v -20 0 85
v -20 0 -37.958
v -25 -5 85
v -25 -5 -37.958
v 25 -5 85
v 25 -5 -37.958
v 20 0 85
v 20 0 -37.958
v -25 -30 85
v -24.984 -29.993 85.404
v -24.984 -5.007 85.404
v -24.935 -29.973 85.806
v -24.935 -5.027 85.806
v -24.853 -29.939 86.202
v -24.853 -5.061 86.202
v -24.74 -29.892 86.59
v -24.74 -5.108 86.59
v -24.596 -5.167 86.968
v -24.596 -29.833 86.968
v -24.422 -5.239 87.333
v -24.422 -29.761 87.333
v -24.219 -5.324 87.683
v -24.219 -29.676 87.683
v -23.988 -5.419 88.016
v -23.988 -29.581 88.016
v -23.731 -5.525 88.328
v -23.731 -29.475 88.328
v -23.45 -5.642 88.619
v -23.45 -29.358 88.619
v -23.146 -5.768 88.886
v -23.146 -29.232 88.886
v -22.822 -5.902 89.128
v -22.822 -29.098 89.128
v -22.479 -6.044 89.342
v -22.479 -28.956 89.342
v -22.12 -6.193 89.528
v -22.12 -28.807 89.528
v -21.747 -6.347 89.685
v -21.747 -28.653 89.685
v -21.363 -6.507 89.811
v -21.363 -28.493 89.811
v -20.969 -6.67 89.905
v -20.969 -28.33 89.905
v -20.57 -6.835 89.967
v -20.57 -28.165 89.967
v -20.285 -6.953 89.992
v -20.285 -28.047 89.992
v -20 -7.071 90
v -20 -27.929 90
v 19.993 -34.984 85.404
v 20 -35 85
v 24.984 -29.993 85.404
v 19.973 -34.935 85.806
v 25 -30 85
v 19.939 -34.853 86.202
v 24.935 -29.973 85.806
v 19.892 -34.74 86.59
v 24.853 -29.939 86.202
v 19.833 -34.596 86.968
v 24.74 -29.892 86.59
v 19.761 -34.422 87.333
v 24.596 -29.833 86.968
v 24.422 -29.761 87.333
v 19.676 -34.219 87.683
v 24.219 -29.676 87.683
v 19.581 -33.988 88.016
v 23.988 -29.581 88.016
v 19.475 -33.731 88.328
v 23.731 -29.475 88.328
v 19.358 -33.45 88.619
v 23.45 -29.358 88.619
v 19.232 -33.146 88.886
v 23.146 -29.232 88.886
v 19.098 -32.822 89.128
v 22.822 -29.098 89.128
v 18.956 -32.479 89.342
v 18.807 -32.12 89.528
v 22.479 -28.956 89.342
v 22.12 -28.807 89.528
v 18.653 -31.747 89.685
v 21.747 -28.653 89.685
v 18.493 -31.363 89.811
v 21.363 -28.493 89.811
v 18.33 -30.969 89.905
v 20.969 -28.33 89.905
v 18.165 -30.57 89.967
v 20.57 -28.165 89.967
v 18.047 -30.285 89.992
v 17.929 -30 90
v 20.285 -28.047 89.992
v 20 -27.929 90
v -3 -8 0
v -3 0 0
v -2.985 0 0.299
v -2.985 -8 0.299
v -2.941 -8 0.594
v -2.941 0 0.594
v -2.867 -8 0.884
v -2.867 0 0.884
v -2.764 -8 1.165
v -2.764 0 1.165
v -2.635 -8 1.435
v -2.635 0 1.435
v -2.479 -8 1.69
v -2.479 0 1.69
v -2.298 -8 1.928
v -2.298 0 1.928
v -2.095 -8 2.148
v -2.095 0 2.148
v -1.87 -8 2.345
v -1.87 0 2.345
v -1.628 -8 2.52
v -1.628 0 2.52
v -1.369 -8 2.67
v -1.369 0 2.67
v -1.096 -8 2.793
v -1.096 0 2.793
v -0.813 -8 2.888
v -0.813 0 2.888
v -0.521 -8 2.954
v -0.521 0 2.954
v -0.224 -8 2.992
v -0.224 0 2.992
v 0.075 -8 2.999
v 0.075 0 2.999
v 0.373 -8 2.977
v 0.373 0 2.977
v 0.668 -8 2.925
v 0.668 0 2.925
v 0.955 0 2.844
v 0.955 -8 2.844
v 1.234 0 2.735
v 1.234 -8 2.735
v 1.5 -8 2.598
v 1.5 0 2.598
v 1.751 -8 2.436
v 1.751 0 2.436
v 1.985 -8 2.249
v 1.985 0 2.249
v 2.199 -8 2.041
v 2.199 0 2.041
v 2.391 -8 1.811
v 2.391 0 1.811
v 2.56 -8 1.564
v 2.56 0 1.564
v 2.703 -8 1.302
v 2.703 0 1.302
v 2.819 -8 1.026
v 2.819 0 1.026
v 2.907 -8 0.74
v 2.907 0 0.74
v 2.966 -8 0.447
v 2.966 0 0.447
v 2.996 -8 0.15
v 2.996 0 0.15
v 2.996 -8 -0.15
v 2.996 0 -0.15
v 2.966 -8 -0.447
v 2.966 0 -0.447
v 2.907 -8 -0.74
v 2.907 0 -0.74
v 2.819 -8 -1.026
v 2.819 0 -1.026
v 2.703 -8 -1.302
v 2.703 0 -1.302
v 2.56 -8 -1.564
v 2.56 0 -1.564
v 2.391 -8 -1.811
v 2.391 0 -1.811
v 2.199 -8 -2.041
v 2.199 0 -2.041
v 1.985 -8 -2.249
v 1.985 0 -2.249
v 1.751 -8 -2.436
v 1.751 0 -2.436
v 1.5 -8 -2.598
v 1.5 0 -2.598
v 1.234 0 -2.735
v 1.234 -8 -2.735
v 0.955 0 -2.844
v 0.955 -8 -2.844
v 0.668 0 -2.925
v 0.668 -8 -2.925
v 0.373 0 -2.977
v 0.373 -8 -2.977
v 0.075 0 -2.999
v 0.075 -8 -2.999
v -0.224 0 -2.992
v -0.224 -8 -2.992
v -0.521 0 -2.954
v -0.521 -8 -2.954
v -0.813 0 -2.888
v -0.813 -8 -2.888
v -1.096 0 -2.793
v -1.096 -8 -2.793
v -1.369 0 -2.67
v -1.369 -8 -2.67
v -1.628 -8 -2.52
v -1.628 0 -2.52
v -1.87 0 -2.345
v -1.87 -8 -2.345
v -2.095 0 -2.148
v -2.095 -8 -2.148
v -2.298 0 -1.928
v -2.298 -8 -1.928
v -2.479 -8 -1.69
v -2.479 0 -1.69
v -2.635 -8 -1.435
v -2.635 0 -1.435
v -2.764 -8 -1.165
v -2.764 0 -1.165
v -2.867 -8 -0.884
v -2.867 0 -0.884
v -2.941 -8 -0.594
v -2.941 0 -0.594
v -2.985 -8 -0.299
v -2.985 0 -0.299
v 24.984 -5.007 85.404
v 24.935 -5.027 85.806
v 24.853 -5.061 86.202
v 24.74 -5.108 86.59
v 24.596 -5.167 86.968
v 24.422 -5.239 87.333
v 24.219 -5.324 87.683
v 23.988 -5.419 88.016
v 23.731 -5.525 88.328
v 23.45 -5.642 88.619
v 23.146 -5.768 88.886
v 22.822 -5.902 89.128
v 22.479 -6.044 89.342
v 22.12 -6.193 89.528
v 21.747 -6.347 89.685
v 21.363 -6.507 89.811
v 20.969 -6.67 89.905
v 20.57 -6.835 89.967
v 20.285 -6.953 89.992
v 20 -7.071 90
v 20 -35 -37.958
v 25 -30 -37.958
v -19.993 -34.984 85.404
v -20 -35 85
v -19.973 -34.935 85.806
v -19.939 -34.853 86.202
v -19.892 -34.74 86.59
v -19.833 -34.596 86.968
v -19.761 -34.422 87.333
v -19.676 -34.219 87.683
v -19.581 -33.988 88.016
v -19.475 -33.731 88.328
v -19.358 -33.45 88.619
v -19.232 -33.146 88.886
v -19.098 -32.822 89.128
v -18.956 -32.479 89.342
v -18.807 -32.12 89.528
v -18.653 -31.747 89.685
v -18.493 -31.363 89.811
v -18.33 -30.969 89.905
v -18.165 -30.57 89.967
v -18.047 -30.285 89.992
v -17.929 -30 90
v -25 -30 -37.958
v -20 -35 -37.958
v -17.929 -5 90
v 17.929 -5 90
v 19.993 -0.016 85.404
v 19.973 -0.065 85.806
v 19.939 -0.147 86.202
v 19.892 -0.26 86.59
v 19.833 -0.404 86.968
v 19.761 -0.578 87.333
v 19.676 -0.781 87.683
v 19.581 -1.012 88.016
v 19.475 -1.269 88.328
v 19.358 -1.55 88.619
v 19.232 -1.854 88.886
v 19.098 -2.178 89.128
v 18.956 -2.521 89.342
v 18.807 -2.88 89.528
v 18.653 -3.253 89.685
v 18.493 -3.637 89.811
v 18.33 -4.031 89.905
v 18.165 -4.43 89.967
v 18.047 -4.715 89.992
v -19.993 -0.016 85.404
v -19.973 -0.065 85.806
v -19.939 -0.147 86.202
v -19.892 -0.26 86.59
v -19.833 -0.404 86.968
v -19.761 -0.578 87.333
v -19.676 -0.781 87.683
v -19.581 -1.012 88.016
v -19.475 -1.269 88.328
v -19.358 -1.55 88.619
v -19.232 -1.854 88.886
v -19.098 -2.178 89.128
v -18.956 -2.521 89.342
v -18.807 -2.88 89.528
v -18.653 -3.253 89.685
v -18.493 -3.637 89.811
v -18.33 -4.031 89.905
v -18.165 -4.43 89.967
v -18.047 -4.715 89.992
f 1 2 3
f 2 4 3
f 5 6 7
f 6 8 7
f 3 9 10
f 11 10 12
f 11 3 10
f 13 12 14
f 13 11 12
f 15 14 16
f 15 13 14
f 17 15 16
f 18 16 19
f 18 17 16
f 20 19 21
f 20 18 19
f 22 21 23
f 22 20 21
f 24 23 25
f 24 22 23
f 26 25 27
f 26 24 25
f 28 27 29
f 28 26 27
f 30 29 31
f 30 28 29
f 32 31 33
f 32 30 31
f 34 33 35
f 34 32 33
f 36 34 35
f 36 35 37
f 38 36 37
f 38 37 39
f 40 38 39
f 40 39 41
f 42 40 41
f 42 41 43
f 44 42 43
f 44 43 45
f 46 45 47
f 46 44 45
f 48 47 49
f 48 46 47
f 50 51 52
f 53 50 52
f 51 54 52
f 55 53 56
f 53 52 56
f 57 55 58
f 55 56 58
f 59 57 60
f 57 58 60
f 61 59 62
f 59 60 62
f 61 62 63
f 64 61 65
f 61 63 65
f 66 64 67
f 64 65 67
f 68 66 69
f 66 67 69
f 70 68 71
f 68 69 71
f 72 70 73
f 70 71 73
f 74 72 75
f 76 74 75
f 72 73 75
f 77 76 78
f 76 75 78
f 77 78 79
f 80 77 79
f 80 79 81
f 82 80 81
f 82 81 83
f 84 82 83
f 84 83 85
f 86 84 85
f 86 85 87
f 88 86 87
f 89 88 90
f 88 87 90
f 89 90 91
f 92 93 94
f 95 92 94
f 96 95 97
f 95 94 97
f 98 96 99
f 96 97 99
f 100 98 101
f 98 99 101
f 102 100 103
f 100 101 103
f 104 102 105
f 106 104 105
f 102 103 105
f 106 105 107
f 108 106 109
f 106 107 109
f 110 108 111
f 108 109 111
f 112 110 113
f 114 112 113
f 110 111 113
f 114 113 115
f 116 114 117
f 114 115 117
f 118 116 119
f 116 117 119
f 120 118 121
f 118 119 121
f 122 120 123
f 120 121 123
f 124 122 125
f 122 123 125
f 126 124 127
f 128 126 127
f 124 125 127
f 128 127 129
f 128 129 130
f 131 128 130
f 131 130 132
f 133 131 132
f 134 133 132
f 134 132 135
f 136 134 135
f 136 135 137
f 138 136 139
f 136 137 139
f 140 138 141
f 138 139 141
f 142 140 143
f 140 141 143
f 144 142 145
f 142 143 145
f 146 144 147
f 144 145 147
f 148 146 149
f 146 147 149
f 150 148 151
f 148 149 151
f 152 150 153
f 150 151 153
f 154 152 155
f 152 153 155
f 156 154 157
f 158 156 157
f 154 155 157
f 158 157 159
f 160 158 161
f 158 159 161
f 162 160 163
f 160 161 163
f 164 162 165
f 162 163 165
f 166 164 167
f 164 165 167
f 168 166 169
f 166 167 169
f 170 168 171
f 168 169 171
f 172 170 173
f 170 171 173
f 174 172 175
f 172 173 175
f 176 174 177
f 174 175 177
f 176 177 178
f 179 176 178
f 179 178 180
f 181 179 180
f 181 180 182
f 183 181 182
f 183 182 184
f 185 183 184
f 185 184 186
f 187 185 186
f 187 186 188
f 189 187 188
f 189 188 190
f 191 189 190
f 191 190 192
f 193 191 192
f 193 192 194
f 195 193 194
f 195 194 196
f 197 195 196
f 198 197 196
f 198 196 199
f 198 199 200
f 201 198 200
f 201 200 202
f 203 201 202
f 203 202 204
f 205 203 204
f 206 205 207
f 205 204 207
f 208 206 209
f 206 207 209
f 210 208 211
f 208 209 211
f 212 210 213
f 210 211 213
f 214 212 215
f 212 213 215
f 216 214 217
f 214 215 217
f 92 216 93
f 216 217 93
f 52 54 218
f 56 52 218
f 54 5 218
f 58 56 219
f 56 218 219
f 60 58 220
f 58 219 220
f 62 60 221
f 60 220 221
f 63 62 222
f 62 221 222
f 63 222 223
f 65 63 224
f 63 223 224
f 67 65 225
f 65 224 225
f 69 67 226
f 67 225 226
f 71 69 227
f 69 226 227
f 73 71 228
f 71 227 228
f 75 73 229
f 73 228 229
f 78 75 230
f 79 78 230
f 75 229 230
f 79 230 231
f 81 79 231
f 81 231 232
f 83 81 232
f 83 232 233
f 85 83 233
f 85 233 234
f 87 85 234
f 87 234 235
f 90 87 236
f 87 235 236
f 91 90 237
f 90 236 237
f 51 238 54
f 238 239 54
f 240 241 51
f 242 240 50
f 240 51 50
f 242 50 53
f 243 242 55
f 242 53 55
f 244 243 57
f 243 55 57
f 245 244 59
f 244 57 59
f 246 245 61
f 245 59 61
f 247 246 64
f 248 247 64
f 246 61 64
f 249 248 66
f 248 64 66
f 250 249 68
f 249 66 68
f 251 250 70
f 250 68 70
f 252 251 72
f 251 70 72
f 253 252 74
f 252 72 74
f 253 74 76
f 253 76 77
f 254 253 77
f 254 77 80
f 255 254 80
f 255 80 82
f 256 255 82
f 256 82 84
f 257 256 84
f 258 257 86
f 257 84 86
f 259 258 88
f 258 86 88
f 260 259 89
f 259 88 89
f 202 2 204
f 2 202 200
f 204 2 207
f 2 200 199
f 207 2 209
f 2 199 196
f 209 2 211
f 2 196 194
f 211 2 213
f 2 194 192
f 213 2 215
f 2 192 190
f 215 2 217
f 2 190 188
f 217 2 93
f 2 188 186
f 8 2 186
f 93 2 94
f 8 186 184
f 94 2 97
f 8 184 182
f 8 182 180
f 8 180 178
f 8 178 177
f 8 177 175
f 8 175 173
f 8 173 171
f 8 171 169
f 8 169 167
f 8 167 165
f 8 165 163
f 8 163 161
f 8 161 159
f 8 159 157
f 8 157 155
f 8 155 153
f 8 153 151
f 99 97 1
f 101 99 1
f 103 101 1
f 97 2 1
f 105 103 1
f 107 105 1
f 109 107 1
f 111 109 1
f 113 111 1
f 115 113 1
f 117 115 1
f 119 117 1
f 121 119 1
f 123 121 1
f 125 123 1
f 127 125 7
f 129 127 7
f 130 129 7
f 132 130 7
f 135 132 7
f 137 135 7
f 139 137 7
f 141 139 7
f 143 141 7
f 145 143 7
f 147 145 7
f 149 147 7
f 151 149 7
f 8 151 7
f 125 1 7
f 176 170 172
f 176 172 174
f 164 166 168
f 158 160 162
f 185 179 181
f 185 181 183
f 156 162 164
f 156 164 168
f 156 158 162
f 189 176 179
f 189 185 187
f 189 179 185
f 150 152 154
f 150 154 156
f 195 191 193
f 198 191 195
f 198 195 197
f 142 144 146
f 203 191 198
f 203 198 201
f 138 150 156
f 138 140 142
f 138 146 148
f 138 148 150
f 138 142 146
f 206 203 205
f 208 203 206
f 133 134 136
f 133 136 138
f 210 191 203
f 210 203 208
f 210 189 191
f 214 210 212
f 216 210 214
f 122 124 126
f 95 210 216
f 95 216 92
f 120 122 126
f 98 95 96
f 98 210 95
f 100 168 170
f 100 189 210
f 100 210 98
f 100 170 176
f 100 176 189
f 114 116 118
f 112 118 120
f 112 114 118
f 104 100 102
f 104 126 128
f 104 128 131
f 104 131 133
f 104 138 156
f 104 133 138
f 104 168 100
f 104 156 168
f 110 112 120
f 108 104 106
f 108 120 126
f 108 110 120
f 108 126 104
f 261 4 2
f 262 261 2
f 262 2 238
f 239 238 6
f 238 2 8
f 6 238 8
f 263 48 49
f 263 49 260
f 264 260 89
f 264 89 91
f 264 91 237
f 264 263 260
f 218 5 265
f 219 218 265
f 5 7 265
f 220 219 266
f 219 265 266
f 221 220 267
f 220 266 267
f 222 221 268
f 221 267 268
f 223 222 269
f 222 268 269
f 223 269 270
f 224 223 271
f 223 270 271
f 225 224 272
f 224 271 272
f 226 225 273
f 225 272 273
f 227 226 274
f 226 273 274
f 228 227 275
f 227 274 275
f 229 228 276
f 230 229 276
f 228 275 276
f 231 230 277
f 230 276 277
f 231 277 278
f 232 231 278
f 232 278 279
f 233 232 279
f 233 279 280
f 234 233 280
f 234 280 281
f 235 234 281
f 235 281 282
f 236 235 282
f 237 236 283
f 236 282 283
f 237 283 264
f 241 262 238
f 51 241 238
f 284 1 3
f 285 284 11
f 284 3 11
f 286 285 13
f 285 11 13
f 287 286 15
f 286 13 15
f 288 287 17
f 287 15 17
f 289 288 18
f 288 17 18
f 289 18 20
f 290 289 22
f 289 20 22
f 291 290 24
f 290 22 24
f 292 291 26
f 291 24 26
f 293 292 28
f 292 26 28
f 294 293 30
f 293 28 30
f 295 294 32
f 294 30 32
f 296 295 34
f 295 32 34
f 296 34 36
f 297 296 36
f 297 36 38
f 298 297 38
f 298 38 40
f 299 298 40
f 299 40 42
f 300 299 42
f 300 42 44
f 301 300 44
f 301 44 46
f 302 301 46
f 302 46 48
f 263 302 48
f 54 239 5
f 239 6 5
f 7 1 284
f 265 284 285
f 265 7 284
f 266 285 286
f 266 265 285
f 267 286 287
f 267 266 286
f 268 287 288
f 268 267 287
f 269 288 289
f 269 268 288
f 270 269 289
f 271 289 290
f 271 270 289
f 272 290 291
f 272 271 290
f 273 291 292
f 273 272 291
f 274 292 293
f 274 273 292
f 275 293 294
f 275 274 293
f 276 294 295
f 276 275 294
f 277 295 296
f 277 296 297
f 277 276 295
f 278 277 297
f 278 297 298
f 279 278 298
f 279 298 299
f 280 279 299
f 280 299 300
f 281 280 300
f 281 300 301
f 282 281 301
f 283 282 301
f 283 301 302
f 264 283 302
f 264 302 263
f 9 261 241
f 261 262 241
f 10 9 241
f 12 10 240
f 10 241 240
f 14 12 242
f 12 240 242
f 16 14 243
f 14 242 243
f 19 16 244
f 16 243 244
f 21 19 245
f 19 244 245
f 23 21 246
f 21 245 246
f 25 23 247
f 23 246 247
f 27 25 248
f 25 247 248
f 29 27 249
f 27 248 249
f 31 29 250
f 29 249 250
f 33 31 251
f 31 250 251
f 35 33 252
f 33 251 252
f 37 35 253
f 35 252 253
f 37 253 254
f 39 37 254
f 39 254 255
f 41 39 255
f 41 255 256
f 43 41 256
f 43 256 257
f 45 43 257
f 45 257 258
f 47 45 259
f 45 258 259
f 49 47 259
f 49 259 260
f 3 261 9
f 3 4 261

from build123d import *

# Parameters (mm, degrees)
F0_W     = 50
F0_H     = 127.9575609275
F1_DEPTH = 10
F2_R     = 3
F3_DEPTH = 8
F4_DEPTH = 25
F5_SIZE  = 5
F6_SIZE  = 5
F7_SIZE  = 5
F8_SIZE  = 5
F9_R     = 5


with BuildPart() as f1:
    # F0 (on Front) → F1 (new body)
    with BuildSketch(Plane.XZ):
        with Locations((0, 26.0212195362)):
            Rectangle(F0_W, F0_H)
    extrude(amount=F1_DEPTH)

    # F2 (on face) → F3 (cut)
    with BuildSketch(Plane(origin=(0, 0, 0), x_dir=(-1, 0, 0), z_dir=(0, 1, 0))):
        Circle(F2_R)
    extrude(amount=-F3_DEPTH, mode=Mode.SUBTRACT)

    # F4 (add): a face of the model
    f4_faces = [f1.faces().sort_by_distance(p)[0] for p in [
        (0, -10, 26.0212195362),
    ]]
    extrude(f4_faces, amount=F4_DEPTH)

    # F5
    f5_edges = [f1.edges().sort_by_distance(p)[0] for p in [
        (25, 0, 26.02122),
    ]]
    chamfer(f5_edges, length=F5_SIZE)

    # F6
    f6_edges = [f1.edges().sort_by_distance(p)[0] for p in [
        (-25, 0, 26.02122),
    ]]
    chamfer(f6_edges, length=F6_SIZE)

    # F7
    f7_edges = [f1.edges().sort_by_distance(p)[0] for p in [
        (-25, -35, 26.02122),
    ]]
    chamfer(f7_edges, length=F7_SIZE)

    # F8
    f8_edges = [f1.edges().sort_by_distance(p)[0] for p in [
        (25, -35, 26.02122),
    ]]
    chamfer(f8_edges, length=F8_SIZE)

    # F9
    f9_edges = [f1.edges().sort_by_distance(p)[0] for p in [
        (0, -35, 90),
        (22.5, -32.5, 90),
        (-22.5, -32.5, 90),
        (25, -17.5, 90),
        (-25, -17.5, 90),
        (22.5, -2.5, 90),
        (-22.5, -2.5, 90),
        (0, 0, 90),
    ]]
    fillet(f9_edges, radius=F9_R)


solid = f1.part
